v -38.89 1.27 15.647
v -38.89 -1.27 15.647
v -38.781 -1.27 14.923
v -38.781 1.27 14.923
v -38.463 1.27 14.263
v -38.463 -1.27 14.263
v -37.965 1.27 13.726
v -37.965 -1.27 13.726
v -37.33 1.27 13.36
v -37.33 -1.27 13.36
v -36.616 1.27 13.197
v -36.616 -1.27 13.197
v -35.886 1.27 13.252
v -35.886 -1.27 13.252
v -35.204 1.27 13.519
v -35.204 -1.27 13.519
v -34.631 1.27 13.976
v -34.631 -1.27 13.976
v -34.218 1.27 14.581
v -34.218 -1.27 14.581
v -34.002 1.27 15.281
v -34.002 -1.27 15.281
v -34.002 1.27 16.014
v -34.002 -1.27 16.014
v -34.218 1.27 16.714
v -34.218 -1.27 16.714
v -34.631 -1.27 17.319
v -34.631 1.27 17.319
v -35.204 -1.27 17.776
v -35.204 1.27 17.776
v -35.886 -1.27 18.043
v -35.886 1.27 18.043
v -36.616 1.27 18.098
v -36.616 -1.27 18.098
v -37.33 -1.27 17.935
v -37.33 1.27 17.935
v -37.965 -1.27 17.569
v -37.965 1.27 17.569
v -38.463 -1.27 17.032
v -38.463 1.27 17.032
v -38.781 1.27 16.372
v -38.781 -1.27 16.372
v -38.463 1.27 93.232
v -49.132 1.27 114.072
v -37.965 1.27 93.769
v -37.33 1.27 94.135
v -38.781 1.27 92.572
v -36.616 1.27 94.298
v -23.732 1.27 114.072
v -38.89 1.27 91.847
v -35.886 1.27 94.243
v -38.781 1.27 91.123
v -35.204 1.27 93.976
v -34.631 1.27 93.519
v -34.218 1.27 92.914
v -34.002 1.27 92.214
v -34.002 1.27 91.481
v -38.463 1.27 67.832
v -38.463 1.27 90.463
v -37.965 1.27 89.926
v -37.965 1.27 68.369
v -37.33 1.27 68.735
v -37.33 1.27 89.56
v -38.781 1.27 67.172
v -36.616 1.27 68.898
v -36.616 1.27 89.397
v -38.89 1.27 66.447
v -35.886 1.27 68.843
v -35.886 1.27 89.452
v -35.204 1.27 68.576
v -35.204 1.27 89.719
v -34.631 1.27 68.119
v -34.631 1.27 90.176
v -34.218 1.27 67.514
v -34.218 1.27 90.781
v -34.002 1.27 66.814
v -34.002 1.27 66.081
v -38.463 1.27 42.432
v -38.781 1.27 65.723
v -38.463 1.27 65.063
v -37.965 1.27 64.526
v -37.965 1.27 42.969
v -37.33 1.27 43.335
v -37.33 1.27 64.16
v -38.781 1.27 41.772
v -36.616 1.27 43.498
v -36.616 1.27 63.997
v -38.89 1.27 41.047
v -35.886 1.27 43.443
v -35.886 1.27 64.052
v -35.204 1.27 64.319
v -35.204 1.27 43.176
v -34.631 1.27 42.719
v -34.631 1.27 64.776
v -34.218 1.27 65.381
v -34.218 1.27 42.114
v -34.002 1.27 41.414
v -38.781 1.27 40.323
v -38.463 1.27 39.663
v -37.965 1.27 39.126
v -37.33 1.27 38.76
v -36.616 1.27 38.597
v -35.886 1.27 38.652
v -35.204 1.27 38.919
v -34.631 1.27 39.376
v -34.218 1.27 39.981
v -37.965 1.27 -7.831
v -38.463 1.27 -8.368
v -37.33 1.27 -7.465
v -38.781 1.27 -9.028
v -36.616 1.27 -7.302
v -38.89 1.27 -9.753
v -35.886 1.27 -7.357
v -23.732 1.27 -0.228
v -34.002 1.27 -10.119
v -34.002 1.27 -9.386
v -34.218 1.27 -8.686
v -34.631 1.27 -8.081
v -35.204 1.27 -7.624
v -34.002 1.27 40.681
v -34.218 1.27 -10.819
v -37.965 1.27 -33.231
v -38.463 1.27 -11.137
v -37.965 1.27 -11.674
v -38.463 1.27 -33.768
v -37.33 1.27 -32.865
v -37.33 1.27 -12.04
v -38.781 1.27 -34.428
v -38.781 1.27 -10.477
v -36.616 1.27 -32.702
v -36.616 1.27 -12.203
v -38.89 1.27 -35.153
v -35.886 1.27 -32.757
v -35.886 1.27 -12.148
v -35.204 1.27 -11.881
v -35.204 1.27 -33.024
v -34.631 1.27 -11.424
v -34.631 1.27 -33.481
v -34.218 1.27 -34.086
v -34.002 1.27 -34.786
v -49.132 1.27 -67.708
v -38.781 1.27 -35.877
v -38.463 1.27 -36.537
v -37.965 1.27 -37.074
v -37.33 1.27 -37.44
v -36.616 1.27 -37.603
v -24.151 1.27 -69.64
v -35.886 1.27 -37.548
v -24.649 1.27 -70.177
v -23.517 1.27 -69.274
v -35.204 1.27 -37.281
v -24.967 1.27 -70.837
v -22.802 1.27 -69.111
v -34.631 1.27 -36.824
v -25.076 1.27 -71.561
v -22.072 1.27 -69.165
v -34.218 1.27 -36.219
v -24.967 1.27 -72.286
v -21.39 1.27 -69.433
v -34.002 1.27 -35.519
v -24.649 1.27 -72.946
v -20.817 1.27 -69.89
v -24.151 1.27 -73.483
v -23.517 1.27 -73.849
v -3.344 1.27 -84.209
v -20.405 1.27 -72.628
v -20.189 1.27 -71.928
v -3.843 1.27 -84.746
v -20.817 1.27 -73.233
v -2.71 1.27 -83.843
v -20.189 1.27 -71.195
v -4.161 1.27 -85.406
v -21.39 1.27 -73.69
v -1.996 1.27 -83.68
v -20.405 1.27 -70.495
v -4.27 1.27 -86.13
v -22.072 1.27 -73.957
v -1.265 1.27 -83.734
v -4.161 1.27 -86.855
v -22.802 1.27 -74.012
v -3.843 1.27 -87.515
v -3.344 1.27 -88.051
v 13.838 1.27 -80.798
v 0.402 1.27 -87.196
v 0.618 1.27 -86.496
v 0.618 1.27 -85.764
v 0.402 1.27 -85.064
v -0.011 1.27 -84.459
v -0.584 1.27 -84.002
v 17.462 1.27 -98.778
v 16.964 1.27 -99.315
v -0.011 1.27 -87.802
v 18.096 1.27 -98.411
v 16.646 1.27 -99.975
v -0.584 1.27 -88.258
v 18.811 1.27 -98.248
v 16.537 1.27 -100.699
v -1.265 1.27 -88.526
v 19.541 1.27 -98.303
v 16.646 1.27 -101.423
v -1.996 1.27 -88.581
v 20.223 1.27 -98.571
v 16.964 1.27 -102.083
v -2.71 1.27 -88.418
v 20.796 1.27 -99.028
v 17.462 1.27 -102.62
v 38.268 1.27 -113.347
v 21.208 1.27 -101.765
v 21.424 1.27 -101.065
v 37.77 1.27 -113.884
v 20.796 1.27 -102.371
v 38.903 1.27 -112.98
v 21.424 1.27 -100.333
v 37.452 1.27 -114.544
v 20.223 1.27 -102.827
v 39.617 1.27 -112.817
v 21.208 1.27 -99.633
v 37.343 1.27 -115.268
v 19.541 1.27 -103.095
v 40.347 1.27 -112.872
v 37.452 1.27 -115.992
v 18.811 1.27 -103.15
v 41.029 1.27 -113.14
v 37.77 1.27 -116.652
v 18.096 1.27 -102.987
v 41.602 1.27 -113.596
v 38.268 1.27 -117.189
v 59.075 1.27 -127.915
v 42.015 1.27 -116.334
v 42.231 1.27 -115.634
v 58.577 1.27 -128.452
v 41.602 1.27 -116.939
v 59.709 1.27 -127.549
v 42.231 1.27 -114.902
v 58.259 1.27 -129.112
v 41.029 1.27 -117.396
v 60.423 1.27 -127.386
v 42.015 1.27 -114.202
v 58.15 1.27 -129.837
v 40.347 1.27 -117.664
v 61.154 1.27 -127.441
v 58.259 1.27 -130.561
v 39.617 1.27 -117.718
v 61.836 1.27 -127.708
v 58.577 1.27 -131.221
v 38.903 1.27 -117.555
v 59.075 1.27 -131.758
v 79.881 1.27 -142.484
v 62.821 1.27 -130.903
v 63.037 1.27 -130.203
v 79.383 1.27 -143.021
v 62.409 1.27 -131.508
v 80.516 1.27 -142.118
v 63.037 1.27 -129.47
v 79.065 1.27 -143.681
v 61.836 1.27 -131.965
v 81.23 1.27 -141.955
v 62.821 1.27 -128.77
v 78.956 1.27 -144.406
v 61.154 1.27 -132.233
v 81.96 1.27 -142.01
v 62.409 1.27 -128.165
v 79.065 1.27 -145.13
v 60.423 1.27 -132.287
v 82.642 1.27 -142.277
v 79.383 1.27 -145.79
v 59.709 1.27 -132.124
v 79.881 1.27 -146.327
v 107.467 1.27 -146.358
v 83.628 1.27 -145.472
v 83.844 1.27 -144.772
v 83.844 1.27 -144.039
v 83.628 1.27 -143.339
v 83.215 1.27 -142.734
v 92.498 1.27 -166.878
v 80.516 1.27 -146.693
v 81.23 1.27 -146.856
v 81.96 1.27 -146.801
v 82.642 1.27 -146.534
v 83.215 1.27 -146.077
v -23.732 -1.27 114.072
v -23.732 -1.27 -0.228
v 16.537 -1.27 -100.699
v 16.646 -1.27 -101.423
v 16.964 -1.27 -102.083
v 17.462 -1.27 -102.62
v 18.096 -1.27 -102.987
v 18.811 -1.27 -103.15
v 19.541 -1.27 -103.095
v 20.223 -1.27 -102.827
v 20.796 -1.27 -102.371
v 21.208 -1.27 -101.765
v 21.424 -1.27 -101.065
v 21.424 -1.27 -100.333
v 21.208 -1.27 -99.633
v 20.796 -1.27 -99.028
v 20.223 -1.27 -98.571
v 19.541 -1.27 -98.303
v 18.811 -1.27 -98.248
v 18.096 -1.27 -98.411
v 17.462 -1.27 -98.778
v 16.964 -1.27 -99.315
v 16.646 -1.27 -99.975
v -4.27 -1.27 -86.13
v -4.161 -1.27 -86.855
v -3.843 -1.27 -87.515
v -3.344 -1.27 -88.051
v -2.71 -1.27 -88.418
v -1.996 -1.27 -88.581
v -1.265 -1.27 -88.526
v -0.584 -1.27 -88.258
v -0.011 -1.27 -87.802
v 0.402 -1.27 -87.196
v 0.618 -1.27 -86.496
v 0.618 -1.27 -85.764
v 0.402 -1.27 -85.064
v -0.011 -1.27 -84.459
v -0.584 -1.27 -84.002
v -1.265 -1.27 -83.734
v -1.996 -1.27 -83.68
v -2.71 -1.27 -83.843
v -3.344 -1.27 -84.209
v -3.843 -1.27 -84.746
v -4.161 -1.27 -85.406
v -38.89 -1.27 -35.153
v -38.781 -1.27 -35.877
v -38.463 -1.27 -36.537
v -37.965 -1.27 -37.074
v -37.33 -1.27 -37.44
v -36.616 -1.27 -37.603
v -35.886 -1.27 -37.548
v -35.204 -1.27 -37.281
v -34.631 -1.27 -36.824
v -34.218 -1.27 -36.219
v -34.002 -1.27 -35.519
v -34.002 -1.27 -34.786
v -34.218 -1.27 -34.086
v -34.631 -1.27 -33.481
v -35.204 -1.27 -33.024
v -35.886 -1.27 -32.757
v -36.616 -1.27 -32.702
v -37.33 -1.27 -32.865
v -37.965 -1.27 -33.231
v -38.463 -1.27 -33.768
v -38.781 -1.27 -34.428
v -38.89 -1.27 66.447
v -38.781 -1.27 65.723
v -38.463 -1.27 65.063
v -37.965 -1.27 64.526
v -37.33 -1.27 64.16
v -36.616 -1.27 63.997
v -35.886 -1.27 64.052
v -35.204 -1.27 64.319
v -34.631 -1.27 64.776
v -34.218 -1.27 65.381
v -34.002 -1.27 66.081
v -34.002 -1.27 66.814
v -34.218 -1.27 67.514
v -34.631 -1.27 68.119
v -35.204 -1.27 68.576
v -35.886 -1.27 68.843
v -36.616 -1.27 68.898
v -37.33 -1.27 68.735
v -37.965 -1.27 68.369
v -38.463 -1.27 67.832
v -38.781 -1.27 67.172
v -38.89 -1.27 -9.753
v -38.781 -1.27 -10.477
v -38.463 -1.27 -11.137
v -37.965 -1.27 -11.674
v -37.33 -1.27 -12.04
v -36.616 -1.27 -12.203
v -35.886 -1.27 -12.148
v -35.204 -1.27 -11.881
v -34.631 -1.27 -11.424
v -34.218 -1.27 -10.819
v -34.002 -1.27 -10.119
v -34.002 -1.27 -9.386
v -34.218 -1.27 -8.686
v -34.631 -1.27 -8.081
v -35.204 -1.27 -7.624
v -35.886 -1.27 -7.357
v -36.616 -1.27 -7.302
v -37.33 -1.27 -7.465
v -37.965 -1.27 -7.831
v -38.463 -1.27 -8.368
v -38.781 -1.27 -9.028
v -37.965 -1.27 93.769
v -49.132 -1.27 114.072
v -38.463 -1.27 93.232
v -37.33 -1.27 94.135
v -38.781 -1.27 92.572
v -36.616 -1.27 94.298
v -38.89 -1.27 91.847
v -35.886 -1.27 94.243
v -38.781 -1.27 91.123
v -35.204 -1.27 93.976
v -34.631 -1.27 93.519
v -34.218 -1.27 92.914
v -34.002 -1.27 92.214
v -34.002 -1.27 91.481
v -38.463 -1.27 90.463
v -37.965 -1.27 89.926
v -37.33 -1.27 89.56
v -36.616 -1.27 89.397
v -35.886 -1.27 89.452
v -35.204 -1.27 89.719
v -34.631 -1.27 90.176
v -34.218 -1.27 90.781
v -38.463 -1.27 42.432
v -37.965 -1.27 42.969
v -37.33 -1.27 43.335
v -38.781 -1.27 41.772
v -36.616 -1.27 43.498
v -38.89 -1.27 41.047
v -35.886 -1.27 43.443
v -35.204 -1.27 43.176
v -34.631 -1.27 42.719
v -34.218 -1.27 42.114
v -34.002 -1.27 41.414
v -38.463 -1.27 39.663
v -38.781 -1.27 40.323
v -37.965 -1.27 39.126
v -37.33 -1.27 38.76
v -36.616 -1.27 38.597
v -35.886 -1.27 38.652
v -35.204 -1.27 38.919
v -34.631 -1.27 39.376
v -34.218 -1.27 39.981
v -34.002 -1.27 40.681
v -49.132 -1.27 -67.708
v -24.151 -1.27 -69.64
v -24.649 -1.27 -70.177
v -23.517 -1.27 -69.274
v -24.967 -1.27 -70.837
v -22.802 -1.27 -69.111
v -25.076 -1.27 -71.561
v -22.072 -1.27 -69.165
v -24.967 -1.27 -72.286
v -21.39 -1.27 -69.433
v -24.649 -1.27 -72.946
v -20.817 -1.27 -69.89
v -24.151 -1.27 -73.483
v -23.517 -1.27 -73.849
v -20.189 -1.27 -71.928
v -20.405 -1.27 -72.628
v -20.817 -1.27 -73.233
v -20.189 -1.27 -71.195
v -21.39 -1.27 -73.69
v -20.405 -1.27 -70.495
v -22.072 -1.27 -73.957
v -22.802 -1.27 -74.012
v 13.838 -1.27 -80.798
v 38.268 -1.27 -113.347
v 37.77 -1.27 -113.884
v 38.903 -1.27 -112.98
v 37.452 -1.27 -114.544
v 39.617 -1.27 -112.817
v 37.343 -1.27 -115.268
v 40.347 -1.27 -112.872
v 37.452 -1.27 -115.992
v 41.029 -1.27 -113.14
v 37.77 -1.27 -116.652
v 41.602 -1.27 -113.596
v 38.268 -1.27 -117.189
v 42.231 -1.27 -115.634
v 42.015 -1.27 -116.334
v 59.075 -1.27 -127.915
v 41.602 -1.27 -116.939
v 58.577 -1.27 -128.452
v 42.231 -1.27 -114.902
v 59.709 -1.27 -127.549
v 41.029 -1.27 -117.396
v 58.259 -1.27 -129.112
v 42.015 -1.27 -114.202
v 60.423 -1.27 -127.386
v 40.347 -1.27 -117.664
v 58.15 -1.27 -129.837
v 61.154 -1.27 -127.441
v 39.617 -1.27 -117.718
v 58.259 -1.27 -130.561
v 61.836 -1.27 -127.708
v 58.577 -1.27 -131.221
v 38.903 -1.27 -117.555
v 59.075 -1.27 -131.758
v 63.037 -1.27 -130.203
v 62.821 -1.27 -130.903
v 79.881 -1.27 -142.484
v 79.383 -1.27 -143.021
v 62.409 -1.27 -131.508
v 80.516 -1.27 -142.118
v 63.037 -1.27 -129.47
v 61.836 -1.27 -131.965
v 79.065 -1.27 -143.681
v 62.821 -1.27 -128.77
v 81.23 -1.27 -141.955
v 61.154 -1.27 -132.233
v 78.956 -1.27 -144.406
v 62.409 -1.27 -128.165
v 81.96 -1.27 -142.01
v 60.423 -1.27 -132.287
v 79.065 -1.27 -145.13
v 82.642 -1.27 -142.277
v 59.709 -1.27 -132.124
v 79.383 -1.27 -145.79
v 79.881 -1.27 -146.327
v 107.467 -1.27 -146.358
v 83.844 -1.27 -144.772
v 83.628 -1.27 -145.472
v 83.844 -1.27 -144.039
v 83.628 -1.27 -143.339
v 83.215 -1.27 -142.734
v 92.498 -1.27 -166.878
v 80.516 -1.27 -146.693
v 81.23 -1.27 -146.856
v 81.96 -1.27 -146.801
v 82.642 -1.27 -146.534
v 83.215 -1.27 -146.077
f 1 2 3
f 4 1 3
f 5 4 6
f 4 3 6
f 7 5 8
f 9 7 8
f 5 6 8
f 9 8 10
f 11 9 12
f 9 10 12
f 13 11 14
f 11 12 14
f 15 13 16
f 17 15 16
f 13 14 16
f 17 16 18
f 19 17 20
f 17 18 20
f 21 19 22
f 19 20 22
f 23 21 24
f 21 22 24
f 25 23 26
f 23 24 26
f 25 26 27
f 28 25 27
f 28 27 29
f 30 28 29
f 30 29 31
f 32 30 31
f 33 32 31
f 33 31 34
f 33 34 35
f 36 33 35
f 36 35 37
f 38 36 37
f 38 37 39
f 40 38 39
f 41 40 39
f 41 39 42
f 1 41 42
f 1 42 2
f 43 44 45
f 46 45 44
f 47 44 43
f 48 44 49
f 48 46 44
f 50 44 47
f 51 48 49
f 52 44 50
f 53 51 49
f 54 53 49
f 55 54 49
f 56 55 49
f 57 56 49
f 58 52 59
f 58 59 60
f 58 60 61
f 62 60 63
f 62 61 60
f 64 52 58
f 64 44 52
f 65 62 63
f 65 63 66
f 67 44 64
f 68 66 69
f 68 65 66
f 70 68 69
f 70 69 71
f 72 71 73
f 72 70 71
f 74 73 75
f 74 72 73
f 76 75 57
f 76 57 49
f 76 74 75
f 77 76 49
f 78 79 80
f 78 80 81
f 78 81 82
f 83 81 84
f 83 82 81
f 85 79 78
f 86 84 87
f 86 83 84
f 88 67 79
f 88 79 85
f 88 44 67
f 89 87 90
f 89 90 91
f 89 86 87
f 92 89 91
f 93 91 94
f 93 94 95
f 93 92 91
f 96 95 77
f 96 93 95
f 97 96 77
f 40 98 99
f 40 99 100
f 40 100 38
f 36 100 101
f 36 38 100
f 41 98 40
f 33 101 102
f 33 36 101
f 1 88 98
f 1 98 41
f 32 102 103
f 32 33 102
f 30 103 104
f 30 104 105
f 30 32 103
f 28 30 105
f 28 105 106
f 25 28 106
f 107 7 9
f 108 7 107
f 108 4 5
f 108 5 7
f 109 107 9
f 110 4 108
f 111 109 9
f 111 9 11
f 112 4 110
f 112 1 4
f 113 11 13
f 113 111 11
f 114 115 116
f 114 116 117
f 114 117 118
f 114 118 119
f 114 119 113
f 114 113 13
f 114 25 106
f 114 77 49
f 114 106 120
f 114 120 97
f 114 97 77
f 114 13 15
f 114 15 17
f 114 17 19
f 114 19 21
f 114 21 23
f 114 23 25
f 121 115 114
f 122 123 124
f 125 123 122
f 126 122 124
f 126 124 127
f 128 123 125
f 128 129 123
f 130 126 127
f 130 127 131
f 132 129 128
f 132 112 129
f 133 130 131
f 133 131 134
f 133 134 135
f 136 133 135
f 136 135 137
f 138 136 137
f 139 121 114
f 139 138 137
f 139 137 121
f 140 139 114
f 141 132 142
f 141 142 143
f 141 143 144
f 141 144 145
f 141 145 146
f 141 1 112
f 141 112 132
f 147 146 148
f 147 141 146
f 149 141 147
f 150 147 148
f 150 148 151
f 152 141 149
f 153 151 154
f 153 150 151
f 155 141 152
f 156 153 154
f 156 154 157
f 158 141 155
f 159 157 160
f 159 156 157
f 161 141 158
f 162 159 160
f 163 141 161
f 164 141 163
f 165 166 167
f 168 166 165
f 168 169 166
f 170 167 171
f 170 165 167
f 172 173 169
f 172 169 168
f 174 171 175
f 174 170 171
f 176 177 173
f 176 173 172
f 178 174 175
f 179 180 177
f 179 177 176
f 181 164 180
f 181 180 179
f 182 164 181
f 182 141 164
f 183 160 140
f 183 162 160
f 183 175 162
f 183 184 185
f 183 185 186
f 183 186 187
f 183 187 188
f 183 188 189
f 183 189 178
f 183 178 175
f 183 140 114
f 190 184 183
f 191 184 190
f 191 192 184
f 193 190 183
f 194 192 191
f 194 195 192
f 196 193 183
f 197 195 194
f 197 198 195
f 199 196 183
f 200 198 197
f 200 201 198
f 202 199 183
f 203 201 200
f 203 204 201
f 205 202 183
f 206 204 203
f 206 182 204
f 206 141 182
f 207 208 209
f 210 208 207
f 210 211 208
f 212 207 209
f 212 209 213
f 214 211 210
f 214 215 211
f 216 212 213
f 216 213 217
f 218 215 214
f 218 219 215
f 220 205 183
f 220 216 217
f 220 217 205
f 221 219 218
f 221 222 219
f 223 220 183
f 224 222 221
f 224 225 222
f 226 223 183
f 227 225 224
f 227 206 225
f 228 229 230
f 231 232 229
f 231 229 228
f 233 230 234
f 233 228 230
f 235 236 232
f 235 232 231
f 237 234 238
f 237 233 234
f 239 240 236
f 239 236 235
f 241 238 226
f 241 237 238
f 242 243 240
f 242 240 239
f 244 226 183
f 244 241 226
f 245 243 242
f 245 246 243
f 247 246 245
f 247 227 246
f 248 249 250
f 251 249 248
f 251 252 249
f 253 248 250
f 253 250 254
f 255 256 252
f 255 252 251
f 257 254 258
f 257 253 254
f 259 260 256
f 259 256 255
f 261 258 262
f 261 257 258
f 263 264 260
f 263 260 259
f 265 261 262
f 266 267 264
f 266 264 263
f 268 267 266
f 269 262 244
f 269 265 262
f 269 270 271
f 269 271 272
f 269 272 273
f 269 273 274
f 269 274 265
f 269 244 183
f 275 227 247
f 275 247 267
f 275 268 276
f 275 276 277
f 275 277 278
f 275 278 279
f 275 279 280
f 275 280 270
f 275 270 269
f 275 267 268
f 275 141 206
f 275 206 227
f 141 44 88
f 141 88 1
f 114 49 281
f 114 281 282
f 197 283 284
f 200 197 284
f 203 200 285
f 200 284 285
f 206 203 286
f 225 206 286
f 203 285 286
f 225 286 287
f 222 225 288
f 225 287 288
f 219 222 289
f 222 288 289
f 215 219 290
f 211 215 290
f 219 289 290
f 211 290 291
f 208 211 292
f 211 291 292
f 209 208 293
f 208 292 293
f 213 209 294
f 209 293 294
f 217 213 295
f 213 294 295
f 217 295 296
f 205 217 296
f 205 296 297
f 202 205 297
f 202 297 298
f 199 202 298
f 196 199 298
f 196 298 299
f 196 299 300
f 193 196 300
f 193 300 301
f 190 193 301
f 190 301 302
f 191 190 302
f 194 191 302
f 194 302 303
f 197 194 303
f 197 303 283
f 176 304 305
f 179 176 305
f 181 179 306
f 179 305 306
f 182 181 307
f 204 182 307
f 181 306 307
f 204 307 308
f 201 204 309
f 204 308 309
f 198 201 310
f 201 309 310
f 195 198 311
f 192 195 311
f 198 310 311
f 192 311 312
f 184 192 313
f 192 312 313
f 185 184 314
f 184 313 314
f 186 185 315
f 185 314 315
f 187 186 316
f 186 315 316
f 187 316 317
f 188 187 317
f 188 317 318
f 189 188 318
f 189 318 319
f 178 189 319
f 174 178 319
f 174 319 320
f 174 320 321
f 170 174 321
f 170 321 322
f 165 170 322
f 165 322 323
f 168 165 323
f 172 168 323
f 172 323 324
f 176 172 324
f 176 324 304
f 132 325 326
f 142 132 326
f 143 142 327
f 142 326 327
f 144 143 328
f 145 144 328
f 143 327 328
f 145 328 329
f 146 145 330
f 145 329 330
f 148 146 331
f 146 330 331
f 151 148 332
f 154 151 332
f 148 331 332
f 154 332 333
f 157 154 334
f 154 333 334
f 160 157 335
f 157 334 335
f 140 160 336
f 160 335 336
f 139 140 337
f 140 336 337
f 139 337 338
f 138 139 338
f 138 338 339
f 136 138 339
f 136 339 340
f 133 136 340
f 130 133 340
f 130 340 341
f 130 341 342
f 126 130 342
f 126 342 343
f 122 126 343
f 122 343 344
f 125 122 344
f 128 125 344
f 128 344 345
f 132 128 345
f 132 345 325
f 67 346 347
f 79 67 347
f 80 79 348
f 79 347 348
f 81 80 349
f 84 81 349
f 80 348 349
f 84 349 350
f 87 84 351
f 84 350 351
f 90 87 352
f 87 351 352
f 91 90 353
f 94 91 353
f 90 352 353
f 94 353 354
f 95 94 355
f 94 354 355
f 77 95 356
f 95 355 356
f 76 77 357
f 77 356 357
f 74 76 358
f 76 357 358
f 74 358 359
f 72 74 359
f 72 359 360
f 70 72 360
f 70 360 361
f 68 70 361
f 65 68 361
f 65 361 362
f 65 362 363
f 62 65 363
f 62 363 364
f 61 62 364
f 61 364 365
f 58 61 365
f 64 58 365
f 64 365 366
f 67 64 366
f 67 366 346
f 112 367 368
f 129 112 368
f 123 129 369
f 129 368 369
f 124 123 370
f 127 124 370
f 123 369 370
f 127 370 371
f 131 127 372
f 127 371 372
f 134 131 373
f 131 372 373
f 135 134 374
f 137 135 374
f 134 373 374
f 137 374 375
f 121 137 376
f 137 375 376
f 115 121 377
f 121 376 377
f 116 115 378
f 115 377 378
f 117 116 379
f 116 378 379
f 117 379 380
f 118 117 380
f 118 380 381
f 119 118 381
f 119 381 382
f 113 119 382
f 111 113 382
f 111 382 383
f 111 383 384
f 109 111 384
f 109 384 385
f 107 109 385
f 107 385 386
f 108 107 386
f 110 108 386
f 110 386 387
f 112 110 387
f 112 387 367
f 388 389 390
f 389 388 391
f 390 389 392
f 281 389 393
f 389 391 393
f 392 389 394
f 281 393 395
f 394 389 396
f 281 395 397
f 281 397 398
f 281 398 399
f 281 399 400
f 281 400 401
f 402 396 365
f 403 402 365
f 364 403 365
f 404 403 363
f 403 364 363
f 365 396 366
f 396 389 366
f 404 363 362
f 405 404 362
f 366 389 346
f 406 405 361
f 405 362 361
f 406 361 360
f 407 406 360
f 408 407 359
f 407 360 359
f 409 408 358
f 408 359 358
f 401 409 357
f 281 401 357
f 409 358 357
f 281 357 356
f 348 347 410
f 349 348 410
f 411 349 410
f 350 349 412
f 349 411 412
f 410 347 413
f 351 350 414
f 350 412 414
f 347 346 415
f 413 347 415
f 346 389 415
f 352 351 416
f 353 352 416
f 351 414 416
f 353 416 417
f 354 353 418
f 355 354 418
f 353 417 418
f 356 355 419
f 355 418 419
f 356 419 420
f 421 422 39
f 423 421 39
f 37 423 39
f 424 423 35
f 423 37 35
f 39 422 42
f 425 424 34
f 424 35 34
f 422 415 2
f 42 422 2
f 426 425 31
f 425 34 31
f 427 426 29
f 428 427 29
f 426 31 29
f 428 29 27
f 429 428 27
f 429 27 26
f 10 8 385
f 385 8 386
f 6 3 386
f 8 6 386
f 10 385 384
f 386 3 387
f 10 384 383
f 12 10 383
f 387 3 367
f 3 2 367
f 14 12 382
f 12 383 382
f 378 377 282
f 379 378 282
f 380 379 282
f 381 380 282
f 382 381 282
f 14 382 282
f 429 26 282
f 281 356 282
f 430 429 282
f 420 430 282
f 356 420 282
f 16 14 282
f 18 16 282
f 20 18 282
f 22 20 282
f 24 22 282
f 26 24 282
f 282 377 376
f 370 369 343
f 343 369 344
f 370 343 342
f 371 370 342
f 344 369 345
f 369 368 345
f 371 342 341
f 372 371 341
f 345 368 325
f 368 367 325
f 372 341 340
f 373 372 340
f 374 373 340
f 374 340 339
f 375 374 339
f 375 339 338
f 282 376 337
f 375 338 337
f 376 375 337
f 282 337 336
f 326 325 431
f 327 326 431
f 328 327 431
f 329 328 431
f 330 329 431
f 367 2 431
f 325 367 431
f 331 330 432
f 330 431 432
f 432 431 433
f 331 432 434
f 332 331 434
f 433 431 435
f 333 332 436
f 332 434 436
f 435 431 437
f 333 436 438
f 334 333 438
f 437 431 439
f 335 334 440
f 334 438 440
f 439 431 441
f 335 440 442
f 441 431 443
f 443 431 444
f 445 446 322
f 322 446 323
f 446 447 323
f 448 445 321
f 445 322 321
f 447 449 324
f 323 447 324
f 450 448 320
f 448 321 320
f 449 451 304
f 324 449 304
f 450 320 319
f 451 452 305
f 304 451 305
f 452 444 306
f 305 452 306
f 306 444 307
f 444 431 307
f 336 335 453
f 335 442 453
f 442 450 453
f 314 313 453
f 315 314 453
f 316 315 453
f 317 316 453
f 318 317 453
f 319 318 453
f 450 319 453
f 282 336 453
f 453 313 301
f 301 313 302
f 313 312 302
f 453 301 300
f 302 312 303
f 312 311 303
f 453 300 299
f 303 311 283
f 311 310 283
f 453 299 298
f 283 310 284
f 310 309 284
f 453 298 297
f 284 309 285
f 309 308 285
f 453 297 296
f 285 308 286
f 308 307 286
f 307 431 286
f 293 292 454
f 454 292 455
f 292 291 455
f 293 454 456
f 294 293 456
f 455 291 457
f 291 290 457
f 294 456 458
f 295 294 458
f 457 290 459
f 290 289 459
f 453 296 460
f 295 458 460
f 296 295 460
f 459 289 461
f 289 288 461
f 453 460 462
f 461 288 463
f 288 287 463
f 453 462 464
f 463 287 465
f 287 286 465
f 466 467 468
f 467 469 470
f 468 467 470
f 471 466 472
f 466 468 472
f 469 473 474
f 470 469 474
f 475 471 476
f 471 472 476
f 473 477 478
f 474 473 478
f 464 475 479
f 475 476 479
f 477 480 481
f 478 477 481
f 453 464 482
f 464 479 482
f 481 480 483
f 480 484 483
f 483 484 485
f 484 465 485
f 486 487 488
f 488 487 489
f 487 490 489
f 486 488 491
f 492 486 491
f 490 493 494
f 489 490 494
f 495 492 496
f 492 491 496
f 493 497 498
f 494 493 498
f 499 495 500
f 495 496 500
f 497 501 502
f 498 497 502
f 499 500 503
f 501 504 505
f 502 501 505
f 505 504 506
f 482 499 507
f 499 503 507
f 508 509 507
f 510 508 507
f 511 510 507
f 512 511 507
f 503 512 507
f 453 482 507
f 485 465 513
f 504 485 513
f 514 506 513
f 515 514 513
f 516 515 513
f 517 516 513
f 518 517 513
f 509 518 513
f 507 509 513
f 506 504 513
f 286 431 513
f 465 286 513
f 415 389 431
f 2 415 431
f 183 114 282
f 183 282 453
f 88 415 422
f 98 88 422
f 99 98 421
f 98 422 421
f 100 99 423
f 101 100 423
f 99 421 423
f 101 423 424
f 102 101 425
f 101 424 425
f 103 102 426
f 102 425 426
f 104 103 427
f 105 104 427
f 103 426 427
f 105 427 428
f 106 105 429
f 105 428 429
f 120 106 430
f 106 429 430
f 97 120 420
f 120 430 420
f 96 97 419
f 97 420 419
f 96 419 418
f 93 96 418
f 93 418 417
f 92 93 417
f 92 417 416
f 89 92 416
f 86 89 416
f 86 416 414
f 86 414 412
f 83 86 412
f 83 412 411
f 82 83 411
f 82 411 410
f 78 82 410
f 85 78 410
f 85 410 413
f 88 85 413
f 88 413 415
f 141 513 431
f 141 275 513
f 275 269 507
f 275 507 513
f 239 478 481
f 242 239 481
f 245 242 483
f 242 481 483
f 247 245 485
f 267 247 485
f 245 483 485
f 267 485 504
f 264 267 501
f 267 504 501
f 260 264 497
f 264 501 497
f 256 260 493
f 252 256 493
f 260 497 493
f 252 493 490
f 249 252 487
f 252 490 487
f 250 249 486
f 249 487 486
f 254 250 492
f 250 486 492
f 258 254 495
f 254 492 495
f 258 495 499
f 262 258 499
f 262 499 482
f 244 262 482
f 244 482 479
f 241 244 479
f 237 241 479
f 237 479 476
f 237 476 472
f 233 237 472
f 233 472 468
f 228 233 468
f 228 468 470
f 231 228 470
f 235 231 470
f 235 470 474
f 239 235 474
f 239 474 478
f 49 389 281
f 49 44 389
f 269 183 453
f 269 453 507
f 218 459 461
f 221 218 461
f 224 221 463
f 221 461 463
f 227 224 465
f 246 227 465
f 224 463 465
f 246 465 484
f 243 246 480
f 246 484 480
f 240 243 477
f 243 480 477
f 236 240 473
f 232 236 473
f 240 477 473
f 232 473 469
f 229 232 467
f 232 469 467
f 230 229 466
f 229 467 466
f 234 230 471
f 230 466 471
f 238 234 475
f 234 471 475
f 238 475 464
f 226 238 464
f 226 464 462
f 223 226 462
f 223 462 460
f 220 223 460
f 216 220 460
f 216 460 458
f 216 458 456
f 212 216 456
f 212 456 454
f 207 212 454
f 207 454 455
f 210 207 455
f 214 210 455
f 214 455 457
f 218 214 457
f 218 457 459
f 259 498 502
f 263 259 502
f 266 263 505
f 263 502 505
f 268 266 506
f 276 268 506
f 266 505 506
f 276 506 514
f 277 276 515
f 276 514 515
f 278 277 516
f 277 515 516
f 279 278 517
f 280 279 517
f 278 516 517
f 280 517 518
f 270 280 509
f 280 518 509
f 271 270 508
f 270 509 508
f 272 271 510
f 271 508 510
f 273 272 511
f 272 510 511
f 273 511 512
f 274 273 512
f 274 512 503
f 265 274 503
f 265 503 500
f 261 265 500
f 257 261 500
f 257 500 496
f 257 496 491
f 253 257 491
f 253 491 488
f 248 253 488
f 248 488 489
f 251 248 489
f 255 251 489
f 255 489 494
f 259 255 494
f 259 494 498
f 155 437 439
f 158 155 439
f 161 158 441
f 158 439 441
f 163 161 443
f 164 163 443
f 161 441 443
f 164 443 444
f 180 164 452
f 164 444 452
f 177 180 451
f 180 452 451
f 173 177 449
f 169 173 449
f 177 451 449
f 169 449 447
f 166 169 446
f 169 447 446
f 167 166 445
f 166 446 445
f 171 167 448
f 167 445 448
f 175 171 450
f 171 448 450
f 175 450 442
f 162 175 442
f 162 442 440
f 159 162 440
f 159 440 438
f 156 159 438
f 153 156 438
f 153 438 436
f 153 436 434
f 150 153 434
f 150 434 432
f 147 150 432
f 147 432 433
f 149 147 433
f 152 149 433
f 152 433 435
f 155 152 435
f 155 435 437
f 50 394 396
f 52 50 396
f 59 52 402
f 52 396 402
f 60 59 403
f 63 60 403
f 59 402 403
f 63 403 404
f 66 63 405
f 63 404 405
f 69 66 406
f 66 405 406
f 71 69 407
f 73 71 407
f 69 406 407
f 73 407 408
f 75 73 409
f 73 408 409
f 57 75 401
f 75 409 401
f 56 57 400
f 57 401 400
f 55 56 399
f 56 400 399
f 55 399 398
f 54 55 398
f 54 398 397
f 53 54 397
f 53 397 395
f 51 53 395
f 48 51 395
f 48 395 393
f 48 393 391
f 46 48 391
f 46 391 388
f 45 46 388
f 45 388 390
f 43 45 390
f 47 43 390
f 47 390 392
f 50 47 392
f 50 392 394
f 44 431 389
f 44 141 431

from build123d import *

# Parameters (mm, degrees)
BOSS_EXTRUDE1_DEPTH              = 1.27
F_10_0_1935_DIAMETER_HOLE2_D     = 4.9149
F_10_0_1935_DIAMETER_HOLE2_DEPTH = 50.8
F_10_0_1935_DIAMETER_HOLE2_TIP   = 1.476584928


with BuildPart() as part:
    # Sketch1 → Boss-Extrude1 (new, symmetric)
    with BuildSketch(Plane(origin=(0, 0, 0), x_dir=(1, 0, 0), z_dir=(0, 1, 0))):
        Polygon((-49.1324746, -114.072394731), (-23.7324746, -114.072394731), (-23.7324746, 0.227605269), (13.838288869, 80.798367536), (107.467367531, 146.358154211), (92.497603039, 166.878050679), (-49.1324746, 67.707602679), align=None)
    extrude(amount=BOSS_EXTRUDE1_DEPTH, both=True)

    # #10 (0.1935) Diameter Hole2
    with Locations(Plane(origin=(0, 1.27, 0), x_dir=(1, 0, 0), z_dir=(0, 1, 0))):
        with Locations((81.413587814, 144.4055404), (60.607125889, 129.836698916), (39.800663964, 115.267857433), (18.994202039, 100.69901595), (-1.812259886, 86.130174466), (-22.618721811, 71.561332983), (-36.4324746, 35.152605269), (-36.4324746, 9.752605269), (-36.4324746, -15.647394731), (-36.4324746, -41.047394731), (-36.4324746, -66.447394731), (-36.4324746, -91.847394731)):
            Hole(F_10_0_1935_DIAMETER_HOLE2_D / 2, depth=F_10_0_1935_DIAMETER_HOLE2_DEPTH)
            with Locations((0, 0, -(F_10_0_1935_DIAMETER_HOLE2_DEPTH + F_10_0_1935_DIAMETER_HOLE2_TIP / 2))):  # 118° drill point
                Cone(0, F_10_0_1935_DIAMETER_HOLE2_D / 2, F_10_0_1935_DIAMETER_HOLE2_TIP, mode=Mode.SUBTRACT)


solid = part.part
